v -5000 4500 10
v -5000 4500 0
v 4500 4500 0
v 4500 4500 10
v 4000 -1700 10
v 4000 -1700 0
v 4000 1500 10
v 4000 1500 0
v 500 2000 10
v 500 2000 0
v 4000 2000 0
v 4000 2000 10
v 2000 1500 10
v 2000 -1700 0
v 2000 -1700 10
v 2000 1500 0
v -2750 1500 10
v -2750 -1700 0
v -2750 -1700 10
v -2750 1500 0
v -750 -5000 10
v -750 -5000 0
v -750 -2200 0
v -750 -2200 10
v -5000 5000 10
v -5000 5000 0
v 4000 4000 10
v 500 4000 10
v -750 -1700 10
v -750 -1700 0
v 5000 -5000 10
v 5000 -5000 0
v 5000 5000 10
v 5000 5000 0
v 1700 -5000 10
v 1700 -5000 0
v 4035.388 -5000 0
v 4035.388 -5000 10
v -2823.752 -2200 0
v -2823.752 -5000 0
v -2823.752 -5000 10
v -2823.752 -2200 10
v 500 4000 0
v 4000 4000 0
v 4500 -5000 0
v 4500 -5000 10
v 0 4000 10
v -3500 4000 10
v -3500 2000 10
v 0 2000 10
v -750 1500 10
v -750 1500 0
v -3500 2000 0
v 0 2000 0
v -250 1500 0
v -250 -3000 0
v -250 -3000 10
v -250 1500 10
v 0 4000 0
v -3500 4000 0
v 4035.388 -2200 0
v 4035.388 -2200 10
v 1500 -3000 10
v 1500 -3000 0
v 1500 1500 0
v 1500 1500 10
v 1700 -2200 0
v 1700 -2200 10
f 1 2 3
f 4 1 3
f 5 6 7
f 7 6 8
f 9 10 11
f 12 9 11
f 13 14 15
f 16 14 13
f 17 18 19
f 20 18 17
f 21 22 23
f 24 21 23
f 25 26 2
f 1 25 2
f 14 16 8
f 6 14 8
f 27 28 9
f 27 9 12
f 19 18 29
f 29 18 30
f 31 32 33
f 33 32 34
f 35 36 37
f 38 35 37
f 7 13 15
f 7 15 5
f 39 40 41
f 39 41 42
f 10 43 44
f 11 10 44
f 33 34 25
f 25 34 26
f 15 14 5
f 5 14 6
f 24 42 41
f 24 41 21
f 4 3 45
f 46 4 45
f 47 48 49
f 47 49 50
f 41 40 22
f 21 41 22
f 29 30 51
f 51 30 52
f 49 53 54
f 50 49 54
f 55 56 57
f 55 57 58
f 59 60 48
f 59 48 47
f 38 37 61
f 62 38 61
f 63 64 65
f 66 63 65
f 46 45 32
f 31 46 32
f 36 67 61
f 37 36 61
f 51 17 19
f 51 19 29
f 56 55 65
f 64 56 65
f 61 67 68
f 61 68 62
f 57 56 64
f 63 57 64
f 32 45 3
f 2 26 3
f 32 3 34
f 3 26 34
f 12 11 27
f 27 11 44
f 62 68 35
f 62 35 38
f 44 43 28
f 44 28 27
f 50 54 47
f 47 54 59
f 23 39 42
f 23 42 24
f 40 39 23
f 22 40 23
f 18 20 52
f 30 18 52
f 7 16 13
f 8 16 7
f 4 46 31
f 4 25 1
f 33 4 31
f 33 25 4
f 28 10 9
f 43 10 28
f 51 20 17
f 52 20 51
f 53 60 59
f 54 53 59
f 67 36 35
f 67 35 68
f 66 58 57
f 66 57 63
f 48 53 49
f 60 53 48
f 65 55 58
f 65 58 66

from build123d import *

# Parameters (mm, degrees)
F2_W     = 2073.7516880035
F2_H     = 2800
F3_DEPTH = 10
F2_W_2   = 2335.388469696
F2_W_3   = 1750
F2_H_2   = 4500
F2_W_4   = 2000
F2_H_3   = 3200
F2_W_5   = 3500
F2_H_4   = 2000
F4_DEPTH = 10


# Not quite as in the source:
# - the program builds the solid bodies; features that only make, move or delete a surface that nothing else refers to are left out


with BuildPart() as f3:
    # F2 (on face) → F3 (new body)
    with BuildSketch(Plane.XY):
        with Locations((-1786.8758440018, -3600)):
            Rectangle(F2_W, F2_H)
    extrude(amount=F3_DEPTH)


with BuildPart() as f3b:
    # F2 (on face) → F3, piece 2 (new body)
    with BuildSketch(Plane.XY):
        with Locations((2867.694234848, -3600)):
            Rectangle(F2_W_2, F2_H)
    extrude(amount=F3_DEPTH)


with BuildPart() as f3c:
    # F2 (on face) → F3, piece 3 (new body)
    with BuildSketch(Plane.XY):
        with Locations((625, -750)):
            Rectangle(F2_W_3, F2_H_2)
    extrude(amount=F3_DEPTH)


with BuildPart() as f3d:
    # F2 (on face) → F3, piece 4 (new body)
    with BuildSketch(Plane.XY):
        with Locations((3000, -100)):
            Rectangle(F2_W_4, F2_H_3)
    extrude(amount=F3_DEPTH)


with BuildPart() as f3e:
    # F2 (on face) → F3, piece 5 (new body)
    with BuildSketch(Plane.XY):
        with Locations((-1750, -100)):
            Rectangle(F2_W_4, F2_H_3)
    extrude(amount=F3_DEPTH)


with BuildPart() as f3f:
    # F2 (on face) → F3, piece 6 (new body)
    with BuildSketch(Plane.XY):
        with Locations((-1750, 3000)):
            Rectangle(F2_W_5, F2_H_4)
    extrude(amount=F3_DEPTH)


with BuildPart() as f3g:
    # F2 (on face) → F3, piece 7 (new body)
    with BuildSketch(Plane.XY):
        with Locations((2250, 3000)):
            Rectangle(F2_W_5, F2_H_4)
    extrude(amount=F3_DEPTH)


with BuildPart() as f4:
    # F1 (on face) → F4 (new body)
    with BuildSketch(Plane.XY):
        Polygon((4500, 4500), (4500, -5000), (5000, -5000), (5000, 5000), (-5000, 5000), (-5000, 4500), align=None)
    extrude(amount=F4_DEPTH)


solid = Compound([f3.part, f3b.part, f3c.part, f3d.part, f3e.part, f3f.part, f3g.part, f4.part])
